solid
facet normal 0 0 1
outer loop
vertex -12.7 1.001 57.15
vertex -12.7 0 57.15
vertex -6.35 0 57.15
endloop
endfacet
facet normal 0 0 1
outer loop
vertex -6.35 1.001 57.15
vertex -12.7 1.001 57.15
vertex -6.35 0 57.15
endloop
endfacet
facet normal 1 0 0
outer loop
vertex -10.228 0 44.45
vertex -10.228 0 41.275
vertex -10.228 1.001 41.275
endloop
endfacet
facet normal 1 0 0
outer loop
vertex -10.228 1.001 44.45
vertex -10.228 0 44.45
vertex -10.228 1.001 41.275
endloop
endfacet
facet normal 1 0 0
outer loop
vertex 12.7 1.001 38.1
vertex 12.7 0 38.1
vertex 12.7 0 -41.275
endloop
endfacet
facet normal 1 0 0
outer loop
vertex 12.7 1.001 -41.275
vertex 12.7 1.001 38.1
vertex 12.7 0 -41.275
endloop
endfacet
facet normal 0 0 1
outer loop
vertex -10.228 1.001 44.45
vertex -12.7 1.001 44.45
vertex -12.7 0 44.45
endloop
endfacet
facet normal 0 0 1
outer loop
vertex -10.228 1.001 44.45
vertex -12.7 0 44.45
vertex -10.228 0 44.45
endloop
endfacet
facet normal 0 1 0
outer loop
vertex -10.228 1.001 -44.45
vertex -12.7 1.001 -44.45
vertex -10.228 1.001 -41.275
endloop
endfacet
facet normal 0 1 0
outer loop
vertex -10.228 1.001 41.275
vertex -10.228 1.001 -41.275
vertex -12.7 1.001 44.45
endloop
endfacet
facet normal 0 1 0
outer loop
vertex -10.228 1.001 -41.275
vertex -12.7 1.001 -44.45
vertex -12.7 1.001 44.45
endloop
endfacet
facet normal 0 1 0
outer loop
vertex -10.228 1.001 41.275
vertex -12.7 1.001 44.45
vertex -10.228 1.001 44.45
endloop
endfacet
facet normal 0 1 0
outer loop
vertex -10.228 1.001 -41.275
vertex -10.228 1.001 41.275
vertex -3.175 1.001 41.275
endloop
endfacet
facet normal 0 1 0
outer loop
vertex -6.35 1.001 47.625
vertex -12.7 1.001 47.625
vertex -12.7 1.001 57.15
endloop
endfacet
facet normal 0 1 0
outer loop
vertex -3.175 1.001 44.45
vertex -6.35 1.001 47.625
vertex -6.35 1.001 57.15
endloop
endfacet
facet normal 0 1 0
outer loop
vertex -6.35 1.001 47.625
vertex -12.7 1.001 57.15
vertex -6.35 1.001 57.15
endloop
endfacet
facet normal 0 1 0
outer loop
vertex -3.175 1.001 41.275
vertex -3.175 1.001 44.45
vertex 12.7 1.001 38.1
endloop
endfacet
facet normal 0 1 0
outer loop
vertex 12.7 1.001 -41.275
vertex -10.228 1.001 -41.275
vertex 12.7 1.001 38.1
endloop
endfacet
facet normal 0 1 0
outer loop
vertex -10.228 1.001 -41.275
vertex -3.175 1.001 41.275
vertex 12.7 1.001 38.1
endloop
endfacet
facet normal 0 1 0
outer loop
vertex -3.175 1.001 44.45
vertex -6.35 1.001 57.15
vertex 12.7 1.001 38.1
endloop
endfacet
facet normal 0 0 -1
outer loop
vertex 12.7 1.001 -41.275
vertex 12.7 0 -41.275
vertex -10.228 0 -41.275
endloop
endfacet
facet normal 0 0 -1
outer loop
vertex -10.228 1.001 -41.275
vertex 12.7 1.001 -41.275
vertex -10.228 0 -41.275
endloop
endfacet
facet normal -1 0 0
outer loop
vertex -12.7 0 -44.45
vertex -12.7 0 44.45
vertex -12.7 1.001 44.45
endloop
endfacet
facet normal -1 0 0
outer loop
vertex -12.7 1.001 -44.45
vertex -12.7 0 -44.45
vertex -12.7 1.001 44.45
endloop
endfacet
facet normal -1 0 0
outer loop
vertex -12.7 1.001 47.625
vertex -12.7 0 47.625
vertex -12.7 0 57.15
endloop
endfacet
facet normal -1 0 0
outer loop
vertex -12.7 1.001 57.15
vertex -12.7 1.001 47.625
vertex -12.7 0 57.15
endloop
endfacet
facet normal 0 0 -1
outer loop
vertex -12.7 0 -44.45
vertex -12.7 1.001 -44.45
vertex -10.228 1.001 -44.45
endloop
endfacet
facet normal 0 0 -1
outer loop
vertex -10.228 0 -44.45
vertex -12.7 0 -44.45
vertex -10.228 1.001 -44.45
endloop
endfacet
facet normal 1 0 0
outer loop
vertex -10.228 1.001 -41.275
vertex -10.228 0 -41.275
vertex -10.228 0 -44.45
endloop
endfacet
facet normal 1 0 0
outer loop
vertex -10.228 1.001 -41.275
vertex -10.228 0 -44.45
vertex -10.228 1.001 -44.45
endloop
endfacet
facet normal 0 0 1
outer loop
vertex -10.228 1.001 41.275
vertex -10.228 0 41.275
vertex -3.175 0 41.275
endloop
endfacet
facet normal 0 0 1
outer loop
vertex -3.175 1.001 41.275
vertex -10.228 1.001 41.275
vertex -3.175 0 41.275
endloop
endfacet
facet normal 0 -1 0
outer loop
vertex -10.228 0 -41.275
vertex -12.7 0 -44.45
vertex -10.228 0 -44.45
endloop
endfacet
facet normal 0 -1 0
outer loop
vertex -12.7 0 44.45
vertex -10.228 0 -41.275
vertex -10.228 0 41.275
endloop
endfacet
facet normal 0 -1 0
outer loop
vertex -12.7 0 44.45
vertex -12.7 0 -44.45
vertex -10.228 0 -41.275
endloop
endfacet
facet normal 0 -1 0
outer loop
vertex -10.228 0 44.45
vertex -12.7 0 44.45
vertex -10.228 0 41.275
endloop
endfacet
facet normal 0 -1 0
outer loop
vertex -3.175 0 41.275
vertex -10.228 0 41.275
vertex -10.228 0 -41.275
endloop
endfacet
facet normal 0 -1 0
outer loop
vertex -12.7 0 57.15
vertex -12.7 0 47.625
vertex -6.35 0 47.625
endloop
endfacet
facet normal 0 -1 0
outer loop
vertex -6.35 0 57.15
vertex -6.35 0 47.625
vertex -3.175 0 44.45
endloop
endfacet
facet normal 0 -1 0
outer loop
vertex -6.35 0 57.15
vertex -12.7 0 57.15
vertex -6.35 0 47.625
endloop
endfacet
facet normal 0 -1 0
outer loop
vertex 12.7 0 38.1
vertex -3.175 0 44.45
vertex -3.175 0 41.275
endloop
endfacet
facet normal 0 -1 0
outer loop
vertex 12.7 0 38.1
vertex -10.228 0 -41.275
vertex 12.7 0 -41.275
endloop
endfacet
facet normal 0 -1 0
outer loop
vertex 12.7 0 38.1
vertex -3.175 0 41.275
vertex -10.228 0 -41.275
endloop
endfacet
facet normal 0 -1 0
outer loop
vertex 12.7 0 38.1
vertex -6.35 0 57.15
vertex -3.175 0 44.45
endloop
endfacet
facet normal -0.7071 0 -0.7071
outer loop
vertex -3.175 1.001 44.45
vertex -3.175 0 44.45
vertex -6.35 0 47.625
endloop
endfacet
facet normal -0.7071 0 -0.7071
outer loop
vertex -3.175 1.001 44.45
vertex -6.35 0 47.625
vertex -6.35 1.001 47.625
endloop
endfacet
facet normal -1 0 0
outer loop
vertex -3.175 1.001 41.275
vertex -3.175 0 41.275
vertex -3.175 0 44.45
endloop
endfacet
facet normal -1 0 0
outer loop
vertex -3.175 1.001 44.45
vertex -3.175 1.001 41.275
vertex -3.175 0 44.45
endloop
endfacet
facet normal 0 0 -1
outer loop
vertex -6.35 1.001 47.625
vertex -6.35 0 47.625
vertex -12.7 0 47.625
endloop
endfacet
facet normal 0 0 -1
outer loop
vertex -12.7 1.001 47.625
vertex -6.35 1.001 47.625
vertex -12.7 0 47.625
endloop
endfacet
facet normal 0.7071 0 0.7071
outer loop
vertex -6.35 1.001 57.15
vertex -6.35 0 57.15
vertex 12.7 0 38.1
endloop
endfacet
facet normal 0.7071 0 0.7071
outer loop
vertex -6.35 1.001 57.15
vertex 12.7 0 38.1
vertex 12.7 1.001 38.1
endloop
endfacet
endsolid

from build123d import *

# Parameters (mm, degrees)
BOSS_EXTRUDE1_DEPTH = 1.00076
SKETCH2_W           = 2.472118206
SKETCH2_H           = 1.00076
BOSS_EXTRUDE2_DEPTH = 3.175
CHAMFER2_SIZE       = 19.05
CHAMFER3_SIZE       = 3.175


with BuildPart() as part:
    # Sketch1 → Boss-Extrude1 (new body)
    with BuildSketch(Plane(origin=(0, 0, 0), x_dir=(1, 0, 0), z_dir=(0, 1, 0))):
        Polygon((-3.175, -41.275), (-3.175, -47.625), (-12.7, -47.625), (-12.7, -57.15), (12.7, -57.15), (12.7, -41.275), (12.7, 41.275), (-12.7, 41.275), (-12.7, -41.275), align=None)
    extrude(amount=BOSS_EXTRUDE1_DEPTH)

    # Sketch2 → Boss-Extrude2 (add)
    with BuildSketch(Plane.XY.offset(41.275)):
        with Locations((-11.463940897, 0.50038)):
            Rectangle(SKETCH2_W, SKETCH2_H)
    boss_extrude2 = extrude(amount=BOSS_EXTRUDE2_DEPTH)

    # Mirror1: Boss-Extrude2 across plane
    add(boss_extrude2.mirror(Plane.XY))

    # Chamfer2
    chamfer2_edges = [part.edges().sort_by_distance(p)[0] for p in [
        (12.7, 0.50038, 57.15),
    ]]
    chamfer(chamfer2_edges, length=CHAMFER2_SIZE)

    # Chamfer3
    chamfer3_edges = [part.edges().sort_by_distance(p)[0] for p in [
        (-3.175, 0.50038, 47.625),
    ]]
    chamfer(chamfer3_edges, length=CHAMFER3_SIZE)


solid = part.part
